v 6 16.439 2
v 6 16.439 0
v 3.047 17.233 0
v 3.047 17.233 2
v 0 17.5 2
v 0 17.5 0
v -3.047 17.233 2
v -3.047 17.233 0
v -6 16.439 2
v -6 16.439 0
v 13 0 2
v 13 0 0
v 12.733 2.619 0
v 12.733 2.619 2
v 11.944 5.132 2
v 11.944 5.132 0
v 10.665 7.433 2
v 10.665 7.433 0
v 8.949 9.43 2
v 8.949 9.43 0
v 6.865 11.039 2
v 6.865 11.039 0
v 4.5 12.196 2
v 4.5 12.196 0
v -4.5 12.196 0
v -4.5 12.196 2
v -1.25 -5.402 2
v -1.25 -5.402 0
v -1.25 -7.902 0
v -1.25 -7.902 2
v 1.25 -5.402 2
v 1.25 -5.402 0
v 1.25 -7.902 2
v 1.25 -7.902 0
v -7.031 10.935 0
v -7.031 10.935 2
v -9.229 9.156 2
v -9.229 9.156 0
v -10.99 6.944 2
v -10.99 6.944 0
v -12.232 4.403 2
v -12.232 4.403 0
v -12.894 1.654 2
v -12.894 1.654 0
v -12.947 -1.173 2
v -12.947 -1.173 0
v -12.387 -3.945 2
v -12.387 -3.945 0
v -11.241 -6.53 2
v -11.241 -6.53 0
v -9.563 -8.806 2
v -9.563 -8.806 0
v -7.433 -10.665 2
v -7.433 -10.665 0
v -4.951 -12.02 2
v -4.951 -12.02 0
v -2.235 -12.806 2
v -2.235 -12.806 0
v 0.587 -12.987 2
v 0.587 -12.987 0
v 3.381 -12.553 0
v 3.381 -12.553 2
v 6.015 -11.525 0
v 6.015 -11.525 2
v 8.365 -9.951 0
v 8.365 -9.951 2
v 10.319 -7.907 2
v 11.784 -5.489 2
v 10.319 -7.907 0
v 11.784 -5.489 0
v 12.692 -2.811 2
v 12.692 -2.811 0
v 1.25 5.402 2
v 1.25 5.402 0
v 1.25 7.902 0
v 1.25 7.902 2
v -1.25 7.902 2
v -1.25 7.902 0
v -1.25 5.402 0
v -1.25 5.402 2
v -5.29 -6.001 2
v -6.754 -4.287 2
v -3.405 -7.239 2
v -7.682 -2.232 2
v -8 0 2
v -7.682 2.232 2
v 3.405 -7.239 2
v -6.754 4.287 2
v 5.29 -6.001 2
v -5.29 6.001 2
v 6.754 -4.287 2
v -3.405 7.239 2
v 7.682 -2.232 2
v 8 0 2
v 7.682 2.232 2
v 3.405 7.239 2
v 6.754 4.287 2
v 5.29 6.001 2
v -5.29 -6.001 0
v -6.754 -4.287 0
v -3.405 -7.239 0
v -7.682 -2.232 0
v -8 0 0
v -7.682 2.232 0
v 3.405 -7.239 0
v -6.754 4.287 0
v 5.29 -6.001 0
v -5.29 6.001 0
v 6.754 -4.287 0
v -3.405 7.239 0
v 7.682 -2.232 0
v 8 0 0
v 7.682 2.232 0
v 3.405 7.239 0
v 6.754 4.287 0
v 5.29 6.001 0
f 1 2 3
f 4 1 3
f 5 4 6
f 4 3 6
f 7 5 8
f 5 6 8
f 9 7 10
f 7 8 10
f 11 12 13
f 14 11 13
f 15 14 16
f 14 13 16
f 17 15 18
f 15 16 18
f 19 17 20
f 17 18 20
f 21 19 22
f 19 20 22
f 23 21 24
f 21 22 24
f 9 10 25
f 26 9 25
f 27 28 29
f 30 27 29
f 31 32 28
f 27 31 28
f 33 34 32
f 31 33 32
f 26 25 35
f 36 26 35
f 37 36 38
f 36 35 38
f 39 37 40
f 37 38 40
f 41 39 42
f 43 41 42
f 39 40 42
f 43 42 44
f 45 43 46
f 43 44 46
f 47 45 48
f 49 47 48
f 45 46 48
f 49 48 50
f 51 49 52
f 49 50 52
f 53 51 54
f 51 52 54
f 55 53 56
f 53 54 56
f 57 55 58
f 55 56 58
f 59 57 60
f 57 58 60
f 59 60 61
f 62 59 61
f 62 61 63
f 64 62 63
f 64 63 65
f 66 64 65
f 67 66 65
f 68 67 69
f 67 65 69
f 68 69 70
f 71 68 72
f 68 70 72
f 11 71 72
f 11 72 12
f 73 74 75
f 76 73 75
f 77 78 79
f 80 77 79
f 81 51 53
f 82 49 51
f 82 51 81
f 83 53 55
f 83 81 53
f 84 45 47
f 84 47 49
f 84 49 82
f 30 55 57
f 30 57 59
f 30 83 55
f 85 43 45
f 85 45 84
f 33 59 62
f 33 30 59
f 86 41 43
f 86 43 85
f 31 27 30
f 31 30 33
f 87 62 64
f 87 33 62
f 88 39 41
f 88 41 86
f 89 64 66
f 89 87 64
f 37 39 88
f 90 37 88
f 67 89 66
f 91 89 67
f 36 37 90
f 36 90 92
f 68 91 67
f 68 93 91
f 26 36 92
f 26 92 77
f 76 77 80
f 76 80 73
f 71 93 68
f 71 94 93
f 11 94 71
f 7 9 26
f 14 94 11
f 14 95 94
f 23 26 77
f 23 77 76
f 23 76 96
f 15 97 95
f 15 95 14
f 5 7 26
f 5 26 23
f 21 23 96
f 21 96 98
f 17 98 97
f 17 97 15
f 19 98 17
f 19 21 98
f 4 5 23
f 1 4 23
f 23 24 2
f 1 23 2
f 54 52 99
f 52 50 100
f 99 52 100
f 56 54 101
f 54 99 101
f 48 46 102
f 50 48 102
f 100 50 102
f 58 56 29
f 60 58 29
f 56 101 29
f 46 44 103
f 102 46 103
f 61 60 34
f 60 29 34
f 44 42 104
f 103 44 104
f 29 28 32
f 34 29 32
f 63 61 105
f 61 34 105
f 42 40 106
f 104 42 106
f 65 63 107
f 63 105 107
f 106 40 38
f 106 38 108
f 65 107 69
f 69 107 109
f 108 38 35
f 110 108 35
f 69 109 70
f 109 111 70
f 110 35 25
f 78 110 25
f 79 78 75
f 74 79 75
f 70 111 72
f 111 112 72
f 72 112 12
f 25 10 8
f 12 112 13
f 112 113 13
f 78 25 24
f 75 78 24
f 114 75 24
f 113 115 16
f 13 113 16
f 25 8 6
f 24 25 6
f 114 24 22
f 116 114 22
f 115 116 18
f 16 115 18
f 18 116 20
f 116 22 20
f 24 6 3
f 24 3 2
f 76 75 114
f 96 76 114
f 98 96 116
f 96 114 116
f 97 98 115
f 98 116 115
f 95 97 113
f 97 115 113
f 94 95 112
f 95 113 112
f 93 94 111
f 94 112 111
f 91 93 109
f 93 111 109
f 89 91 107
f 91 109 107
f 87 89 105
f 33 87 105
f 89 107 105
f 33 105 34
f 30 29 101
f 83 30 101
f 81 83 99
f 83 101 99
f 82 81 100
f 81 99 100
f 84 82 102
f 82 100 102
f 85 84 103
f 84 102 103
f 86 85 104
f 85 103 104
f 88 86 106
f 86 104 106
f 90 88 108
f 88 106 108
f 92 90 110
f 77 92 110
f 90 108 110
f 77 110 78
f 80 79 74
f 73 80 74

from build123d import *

# Parameters (mm, degrees)
F1_DEPTH = 2


with BuildPart() as f1:
    # F0 (on Top) → F1 (new body)
    with BuildSketch(Plane.XY):
        with BuildLine():
            ThreePointArc((-4.5, 12.196311), (-7.433034, -10.665365), (13, 0))
            ThreePointArc((13, 0), (10.665365, 7.433034), (4.5, 12.196311))
            ThreePointArc((4.5, 12.196311), (0, 13), (-4.5, 12.196311))
        make_face()
        with BuildLine():
            ThreePointArc((-1.25, -7.90174), (-8, 0), (-1.25, 7.90174))
            Line((-1.25, 7.90174), (-1.25, 5.40174))
            Line((-1.25, 5.40174), (1.25, 5.40174))
            Line((1.25, 5.40174), (1.25, 7.90174))
            ThreePointArc((1.25, 7.90174), (8, 0), (1.25, -7.90174))
            Line((1.25, -7.90174), (1.25, -5.40174))
            Line((1.25, -5.40174), (-1.25, -5.40174))
            Line((-1.25, -5.40174), (-1.25, -7.90174))
        make_face(mode=Mode.SUBTRACT)
        with BuildLine():
            ThreePointArc((-4.5, 12.196311), (0, 13), (4.5, 12.196311))
            Line((4.5, 12.196311), (6, 16.439282))
            ThreePointArc((6, 16.439282), (0, 17.5), (-6, 16.439282))
            Line((-6, 16.439282), (-4.5, 12.196311))
        make_face()
    extrude(amount=F1_DEPTH)


solid = f1.part
